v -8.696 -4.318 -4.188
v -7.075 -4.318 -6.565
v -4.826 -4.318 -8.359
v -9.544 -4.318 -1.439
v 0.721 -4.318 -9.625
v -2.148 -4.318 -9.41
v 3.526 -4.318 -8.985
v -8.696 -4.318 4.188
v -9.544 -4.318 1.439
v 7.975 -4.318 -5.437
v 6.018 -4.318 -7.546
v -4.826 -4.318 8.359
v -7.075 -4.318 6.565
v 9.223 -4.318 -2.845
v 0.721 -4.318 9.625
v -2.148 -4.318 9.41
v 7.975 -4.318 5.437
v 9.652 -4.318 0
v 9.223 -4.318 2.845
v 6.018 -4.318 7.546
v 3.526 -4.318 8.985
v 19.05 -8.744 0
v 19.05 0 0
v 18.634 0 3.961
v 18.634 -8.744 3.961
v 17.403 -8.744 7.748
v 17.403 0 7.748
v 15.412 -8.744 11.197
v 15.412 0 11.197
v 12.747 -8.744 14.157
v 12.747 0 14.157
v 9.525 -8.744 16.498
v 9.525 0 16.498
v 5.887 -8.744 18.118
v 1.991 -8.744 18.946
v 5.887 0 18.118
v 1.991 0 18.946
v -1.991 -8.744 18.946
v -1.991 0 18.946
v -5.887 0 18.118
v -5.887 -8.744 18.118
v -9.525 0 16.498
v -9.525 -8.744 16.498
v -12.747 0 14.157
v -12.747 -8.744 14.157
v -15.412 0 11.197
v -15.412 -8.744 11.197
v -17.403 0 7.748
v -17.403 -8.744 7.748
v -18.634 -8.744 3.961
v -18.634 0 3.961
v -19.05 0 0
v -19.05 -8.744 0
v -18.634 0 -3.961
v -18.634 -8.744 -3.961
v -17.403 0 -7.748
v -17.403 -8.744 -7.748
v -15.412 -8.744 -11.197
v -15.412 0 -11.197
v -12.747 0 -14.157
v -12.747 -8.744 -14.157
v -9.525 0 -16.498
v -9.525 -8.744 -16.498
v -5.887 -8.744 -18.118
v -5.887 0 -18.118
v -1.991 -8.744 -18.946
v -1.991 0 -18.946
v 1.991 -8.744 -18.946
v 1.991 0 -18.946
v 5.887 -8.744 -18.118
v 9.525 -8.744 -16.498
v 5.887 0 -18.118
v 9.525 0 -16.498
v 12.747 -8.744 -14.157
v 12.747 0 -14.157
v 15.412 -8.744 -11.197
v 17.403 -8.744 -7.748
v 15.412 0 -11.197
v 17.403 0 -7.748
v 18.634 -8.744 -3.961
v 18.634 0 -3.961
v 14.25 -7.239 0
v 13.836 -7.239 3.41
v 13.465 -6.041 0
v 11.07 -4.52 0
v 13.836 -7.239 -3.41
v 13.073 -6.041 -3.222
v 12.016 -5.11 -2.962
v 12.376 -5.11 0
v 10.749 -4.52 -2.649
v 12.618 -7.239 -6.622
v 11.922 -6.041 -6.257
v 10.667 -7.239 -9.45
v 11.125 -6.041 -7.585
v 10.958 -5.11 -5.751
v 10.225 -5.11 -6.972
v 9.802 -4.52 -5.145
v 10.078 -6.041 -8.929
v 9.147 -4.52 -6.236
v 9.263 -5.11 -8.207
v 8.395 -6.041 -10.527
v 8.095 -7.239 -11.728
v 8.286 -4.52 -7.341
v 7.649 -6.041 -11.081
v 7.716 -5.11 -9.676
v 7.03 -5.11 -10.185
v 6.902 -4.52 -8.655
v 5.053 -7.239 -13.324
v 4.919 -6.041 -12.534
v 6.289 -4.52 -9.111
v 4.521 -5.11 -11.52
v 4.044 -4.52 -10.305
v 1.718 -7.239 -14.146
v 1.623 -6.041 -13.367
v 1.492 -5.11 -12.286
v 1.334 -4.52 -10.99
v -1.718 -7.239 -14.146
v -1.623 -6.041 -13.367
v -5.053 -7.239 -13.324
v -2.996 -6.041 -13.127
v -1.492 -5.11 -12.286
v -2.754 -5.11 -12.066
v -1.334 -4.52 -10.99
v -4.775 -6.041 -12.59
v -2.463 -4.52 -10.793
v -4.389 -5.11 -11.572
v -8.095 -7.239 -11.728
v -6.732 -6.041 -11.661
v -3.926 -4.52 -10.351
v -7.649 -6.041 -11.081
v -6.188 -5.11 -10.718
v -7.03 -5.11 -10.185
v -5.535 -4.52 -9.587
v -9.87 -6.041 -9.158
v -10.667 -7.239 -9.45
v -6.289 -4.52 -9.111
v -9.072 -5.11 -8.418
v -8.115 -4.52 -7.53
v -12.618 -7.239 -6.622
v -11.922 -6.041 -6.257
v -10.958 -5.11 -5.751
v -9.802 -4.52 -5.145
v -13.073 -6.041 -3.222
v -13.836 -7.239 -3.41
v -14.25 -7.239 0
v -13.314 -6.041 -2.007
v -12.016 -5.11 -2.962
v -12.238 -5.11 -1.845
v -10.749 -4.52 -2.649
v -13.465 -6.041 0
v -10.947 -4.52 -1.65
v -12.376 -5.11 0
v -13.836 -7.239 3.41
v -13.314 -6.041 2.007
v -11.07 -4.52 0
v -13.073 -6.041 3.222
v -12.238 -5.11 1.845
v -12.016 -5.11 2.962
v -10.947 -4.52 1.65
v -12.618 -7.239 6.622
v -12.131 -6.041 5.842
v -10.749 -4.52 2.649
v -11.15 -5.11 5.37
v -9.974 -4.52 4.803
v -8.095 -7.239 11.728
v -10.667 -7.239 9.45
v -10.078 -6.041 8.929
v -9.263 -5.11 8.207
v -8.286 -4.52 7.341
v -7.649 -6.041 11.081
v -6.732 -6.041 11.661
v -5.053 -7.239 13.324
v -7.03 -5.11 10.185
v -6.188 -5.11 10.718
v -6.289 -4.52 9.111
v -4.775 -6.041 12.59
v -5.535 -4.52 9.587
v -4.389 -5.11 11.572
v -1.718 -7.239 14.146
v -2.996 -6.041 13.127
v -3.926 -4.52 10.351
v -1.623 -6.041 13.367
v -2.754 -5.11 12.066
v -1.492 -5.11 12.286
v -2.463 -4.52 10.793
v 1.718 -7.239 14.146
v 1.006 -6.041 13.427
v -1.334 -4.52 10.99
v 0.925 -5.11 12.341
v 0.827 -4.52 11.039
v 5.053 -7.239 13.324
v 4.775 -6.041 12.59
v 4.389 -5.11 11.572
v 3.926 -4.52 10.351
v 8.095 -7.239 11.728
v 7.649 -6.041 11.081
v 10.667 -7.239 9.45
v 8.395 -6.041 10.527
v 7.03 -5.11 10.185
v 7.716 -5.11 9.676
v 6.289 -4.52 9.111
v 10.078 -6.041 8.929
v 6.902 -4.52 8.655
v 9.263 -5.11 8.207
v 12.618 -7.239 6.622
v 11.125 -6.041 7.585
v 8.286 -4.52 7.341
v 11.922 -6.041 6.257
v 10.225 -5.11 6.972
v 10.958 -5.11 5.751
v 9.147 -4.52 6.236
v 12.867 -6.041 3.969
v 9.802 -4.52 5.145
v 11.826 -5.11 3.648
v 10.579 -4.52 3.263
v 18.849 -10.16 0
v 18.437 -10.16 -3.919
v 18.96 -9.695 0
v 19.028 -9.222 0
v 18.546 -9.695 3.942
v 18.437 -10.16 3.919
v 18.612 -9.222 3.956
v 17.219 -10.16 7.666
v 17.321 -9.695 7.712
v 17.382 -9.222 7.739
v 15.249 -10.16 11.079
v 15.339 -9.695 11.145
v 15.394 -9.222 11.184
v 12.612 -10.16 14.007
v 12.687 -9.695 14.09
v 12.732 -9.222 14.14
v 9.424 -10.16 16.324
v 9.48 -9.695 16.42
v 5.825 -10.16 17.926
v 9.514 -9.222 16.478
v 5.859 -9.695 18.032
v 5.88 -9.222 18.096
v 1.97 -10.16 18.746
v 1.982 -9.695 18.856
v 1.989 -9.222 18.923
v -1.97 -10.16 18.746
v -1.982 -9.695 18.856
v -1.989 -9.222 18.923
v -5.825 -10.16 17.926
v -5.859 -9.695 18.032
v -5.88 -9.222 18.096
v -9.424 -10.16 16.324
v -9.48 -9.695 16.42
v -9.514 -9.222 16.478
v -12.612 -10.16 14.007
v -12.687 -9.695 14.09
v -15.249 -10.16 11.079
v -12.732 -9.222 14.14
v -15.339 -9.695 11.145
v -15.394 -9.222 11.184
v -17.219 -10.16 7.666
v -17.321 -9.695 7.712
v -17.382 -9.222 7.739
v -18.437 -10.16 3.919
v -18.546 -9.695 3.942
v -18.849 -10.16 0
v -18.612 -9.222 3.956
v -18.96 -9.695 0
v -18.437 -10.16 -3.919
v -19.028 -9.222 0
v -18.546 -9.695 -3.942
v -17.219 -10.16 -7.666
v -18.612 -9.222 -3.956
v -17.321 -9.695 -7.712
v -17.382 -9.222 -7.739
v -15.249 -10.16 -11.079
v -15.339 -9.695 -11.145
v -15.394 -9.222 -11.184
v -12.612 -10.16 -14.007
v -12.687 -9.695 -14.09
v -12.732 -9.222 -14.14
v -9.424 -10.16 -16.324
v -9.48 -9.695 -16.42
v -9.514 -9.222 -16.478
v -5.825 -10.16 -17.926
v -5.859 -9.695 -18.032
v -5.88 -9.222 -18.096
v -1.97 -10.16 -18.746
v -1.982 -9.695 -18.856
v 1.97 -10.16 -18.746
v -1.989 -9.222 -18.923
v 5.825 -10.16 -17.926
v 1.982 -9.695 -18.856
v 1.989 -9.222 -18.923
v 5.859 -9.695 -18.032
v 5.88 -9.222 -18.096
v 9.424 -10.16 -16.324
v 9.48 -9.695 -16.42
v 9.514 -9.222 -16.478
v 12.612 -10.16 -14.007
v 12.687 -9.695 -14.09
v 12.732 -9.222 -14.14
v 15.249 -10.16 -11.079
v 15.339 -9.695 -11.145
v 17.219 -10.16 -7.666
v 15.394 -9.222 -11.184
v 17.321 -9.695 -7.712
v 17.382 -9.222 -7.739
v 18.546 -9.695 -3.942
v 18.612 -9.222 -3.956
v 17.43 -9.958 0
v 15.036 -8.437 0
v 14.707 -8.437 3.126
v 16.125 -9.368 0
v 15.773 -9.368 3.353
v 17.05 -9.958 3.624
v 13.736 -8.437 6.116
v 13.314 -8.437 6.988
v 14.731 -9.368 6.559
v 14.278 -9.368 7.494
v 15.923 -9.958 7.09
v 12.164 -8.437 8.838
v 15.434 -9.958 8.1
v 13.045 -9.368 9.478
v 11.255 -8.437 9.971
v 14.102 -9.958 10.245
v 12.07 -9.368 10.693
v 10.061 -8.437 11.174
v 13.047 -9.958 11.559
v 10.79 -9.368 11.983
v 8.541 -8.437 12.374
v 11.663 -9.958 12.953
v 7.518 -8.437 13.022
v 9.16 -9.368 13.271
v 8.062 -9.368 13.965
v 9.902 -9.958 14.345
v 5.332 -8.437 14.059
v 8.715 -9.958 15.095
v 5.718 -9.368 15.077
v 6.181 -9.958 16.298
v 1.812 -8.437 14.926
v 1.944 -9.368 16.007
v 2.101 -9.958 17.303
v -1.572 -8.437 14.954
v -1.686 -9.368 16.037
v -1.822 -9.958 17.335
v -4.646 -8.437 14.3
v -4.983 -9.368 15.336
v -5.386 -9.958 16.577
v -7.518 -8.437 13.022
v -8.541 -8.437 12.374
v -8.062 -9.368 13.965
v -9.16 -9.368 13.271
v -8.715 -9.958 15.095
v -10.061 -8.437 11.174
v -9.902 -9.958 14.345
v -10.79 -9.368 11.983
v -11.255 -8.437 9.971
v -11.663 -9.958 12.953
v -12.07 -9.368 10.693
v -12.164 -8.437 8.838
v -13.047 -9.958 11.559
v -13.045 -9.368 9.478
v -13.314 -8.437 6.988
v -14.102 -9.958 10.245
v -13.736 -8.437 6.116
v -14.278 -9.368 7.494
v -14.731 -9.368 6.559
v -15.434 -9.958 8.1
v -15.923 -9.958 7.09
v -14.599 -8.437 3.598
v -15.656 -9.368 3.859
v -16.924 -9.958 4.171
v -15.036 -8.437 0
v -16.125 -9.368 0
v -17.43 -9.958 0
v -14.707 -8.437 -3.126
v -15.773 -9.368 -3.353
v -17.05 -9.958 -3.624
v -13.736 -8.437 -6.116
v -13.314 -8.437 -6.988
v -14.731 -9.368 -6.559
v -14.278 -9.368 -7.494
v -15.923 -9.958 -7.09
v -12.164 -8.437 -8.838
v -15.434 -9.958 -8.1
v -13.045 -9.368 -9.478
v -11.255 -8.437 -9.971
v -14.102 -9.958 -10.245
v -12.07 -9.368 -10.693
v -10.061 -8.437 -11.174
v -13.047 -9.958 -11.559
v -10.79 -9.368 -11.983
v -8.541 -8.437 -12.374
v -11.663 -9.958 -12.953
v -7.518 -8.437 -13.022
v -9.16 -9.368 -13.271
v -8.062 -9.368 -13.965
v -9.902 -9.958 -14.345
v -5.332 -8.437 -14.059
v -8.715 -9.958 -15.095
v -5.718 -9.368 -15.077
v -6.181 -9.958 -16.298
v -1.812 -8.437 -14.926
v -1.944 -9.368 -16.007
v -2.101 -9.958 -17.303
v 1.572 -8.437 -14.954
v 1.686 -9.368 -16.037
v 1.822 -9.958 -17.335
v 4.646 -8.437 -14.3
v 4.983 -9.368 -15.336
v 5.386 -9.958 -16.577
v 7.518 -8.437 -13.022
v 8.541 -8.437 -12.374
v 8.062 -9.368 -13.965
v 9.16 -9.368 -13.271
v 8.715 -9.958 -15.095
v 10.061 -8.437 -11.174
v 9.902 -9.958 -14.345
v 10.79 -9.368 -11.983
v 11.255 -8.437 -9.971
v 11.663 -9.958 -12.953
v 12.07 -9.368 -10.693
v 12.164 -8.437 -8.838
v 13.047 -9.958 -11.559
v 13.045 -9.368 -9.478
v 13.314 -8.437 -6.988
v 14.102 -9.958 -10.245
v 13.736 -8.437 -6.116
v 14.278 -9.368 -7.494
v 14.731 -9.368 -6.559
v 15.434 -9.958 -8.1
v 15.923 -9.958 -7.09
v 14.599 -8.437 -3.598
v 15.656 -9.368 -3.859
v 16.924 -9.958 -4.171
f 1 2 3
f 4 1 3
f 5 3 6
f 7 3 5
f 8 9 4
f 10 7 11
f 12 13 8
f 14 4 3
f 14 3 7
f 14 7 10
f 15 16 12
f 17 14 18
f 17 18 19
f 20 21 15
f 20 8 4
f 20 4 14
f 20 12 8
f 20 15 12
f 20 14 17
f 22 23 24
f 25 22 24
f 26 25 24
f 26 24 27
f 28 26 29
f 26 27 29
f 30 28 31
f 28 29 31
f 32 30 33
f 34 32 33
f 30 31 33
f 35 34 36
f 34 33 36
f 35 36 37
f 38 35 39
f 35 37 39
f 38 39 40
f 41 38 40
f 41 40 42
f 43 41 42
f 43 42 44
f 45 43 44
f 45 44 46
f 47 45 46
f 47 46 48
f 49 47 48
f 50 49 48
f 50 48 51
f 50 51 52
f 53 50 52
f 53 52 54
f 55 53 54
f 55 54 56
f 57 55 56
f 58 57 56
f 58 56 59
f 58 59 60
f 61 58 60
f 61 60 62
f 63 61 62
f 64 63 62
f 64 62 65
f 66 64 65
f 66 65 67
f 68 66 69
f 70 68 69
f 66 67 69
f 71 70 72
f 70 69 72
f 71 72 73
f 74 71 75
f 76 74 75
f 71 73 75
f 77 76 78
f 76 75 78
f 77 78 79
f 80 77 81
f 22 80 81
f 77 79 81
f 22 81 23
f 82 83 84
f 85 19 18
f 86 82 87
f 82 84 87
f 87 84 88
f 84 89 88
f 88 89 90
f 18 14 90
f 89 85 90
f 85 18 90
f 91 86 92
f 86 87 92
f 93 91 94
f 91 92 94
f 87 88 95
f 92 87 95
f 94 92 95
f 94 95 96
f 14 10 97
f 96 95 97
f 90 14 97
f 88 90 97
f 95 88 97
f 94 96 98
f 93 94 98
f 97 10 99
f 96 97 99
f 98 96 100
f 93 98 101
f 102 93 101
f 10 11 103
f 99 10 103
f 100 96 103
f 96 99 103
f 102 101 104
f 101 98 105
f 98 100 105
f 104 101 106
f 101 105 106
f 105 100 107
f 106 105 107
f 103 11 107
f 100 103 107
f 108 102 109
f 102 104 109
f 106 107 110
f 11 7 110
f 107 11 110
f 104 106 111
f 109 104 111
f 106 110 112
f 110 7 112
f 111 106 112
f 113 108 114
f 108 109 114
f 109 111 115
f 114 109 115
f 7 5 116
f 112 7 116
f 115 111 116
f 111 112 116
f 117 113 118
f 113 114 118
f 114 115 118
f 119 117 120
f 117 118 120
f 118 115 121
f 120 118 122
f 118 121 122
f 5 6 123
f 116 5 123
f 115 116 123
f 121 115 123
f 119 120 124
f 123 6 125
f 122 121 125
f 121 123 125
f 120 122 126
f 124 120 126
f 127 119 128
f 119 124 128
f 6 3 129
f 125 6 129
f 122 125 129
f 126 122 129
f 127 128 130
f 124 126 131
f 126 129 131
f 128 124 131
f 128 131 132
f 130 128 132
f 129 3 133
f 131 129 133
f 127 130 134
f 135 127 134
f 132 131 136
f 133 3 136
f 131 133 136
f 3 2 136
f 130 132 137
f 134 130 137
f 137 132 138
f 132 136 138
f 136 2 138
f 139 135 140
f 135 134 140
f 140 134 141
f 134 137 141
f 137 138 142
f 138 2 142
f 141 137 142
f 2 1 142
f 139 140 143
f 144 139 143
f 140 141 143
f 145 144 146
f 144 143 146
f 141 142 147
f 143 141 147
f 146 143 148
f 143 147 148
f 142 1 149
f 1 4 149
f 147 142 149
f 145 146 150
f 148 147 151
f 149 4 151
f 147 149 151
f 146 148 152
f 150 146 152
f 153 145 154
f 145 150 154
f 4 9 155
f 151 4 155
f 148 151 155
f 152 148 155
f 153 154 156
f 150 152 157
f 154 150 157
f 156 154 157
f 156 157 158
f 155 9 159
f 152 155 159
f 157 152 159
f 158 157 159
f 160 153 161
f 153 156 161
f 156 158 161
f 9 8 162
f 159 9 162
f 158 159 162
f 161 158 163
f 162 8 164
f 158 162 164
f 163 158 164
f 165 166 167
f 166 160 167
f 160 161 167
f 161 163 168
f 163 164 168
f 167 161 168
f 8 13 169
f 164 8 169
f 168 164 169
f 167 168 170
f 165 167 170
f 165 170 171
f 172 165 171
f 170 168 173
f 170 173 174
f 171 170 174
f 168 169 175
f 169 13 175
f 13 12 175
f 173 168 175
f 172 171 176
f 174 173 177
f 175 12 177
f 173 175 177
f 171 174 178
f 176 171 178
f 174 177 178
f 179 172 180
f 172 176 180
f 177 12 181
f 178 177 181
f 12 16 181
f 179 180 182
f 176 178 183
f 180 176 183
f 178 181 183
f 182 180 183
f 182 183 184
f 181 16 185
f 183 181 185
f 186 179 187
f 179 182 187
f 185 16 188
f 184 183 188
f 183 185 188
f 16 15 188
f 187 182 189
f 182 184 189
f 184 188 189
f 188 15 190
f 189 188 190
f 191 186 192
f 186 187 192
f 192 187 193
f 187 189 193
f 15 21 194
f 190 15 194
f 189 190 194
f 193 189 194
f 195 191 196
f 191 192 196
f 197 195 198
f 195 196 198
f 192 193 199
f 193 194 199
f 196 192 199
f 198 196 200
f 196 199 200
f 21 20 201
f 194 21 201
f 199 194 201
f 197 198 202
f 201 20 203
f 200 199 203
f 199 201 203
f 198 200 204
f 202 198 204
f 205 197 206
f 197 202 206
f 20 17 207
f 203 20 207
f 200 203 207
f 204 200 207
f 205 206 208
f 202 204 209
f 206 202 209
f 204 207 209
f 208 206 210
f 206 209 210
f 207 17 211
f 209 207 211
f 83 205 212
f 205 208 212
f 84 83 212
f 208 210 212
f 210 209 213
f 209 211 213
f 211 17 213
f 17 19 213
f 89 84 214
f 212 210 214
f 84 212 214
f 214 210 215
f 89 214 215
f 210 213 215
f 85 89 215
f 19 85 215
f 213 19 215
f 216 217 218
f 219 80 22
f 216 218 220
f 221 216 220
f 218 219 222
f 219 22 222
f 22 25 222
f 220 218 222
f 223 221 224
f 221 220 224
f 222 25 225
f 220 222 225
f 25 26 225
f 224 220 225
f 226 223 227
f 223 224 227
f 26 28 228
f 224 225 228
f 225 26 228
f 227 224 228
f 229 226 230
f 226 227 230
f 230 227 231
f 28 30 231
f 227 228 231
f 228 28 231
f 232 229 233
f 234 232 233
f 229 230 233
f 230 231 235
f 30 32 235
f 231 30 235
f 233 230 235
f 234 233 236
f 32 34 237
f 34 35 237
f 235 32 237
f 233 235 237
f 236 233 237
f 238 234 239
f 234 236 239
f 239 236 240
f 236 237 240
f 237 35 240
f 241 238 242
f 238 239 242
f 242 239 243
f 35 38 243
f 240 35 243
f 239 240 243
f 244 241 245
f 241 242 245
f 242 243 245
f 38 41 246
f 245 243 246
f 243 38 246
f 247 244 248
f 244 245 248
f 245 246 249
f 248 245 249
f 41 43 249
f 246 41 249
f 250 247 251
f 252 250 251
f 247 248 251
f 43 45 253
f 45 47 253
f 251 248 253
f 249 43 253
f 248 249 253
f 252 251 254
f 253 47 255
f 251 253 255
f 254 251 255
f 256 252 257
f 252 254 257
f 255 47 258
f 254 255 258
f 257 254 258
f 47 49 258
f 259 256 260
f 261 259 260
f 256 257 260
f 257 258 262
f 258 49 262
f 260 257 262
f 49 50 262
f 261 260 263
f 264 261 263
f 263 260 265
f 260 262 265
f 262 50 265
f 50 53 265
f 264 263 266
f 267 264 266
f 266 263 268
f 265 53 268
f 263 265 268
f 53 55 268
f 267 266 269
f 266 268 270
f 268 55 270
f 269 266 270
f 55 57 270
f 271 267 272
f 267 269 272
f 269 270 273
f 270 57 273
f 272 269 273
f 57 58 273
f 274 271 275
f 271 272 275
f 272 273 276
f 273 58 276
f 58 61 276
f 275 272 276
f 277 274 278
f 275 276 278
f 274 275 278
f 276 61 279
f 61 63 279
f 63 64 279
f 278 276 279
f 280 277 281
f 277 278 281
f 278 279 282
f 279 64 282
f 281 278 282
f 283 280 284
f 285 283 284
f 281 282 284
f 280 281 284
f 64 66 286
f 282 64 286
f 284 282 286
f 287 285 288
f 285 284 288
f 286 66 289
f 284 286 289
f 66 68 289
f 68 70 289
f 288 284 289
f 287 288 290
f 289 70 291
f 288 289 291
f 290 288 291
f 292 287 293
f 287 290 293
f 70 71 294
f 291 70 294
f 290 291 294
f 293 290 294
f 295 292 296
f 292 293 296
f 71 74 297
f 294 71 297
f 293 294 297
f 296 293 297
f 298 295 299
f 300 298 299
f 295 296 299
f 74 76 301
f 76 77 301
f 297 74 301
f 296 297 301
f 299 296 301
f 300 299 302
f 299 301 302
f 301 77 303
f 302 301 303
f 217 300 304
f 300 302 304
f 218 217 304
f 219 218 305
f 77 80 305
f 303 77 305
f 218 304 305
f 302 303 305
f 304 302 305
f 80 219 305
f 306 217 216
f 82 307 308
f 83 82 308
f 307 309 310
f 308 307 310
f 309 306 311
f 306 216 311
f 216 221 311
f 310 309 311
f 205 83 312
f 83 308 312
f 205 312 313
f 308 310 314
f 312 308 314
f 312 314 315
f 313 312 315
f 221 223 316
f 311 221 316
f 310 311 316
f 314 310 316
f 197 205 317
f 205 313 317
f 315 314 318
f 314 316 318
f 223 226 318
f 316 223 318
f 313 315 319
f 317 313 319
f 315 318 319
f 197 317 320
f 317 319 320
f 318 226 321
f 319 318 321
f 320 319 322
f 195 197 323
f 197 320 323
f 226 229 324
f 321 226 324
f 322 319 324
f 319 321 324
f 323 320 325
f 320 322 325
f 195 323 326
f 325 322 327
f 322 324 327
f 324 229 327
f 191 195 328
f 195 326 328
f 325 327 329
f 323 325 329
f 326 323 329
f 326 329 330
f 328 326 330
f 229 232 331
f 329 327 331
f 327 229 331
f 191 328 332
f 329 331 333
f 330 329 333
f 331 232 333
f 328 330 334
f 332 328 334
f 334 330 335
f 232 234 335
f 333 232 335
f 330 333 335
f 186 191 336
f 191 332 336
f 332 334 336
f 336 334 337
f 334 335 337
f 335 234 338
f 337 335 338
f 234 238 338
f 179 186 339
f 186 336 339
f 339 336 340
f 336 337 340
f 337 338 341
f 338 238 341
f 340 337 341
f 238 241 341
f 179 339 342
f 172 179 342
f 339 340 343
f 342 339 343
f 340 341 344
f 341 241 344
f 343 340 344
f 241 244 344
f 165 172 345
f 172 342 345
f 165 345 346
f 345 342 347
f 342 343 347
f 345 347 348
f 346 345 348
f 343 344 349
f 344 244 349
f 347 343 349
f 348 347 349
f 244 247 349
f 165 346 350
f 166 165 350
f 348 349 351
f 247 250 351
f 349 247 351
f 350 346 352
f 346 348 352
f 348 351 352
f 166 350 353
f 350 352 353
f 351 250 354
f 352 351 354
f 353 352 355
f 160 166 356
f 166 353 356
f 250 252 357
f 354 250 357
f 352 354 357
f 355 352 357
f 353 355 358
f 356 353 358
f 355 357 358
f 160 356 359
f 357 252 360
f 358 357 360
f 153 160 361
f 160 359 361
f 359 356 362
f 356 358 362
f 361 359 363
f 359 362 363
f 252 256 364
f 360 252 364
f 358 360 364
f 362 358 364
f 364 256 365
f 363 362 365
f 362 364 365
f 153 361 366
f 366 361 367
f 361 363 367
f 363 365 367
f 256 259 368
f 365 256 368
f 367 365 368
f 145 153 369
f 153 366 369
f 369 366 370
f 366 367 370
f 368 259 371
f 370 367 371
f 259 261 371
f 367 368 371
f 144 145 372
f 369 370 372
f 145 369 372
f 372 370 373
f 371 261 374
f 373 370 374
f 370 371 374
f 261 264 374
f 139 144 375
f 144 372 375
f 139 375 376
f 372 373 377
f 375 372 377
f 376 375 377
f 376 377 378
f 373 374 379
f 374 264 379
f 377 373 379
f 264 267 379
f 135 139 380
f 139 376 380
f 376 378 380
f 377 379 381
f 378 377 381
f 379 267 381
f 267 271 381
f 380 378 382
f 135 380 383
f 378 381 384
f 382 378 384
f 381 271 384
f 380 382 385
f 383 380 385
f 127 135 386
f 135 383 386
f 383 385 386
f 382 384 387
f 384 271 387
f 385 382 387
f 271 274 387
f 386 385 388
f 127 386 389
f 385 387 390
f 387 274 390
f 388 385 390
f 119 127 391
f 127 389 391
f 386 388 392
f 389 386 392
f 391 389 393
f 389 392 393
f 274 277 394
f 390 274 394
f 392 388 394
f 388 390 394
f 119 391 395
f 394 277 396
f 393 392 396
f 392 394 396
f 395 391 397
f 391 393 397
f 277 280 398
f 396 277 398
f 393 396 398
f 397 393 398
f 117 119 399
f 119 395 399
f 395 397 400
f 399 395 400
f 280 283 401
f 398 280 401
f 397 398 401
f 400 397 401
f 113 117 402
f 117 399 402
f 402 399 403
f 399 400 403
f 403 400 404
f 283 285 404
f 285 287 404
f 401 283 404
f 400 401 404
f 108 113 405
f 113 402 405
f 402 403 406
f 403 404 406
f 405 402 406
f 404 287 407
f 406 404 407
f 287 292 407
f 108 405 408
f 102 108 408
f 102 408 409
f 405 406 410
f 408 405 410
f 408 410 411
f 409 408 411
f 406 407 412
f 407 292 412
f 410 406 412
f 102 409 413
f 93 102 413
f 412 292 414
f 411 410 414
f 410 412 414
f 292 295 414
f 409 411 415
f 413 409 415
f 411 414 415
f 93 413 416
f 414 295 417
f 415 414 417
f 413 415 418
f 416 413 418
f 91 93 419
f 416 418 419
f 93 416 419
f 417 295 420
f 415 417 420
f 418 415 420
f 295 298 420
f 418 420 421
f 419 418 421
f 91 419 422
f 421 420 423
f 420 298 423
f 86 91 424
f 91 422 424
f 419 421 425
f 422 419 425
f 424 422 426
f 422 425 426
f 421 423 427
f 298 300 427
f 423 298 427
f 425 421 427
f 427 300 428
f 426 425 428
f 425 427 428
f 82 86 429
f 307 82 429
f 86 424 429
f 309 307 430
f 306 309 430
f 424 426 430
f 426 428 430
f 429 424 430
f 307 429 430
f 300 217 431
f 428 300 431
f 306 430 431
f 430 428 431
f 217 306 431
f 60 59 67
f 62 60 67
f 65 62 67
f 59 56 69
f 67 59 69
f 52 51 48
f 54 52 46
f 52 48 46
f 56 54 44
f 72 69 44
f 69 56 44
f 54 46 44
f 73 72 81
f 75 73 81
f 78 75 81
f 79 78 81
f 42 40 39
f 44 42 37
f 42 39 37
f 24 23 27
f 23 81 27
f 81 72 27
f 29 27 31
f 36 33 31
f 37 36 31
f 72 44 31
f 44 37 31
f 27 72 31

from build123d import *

# Parameters (mm, degrees)
F0_R     = 19.05
F1_DEPTH = 10.16
F2_T     = -4.318
F3_R     = 5.08


# Not quite as in the source:
# - a fillet or chamfer that OpenCascade refuses, or shapes differently, is made with other operations: its cross-section is extruded or revolved along the edge and cut away or added


with BuildPart() as f1:
    # F0 (on Front) → F1 (new body)
    with BuildSketch(Plane.XZ):
        Circle(F0_R)
    extrude(amount=F1_DEPTH)

    # F2
    f2_openings = [f1.faces().sort_by_distance(p)[0] for p in [
        (0, -10.16, 0),
    ]]
    offset(amount=F2_T, openings=f2_openings)

    # F3
    f3_edges = [f1.edges().sort_by_distance(p)[0] for p in [
        (-14.732, -4.318, 0),
    ]]
    fillet(f3_edges, radius=F3_R)

    # F4: fillet of radius 5.08 on 1 edges, made by hand

    # F4_s1 → F4_t2 (revolve, cut)
    with BuildSketch(Plane.XY):
        with BuildLine():
            ThreePointArc((14.2503822155, -7.239), (16.1249178862, -9.3680135261), (18.848764431, -10.16))
            Line((18.848764431, -10.16), (18.848764431, -10.668))
            Line((18.848764431, -10.668), (14.732, -10.668))
            Line((14.732, -10.668), (14.224, -10.16))
            ThreePointArc((14.224, -10.16), (14.224, -9.398), (13.790543994, -7.4549))
            Line((13.790543994, -7.4549), (14.2503822155, -7.239))
        make_face()
    revolve(axis=Axis((0, -10.16, 0), (0, -1, 0)), mode=Mode.SUBTRACT)

    # F5: fillet of radius 5.08 on 1 edges, made by hand

    # F5_s1 → F5_t2 (revolve, cut)
    with BuildSketch(Plane.XY):
        with BuildLine():
            ThreePointArc((18.848764431, -10.16), (18.9994394971, -9.4592919765), (19.05, -8.7443525768))
            Line((19.05, -8.7443525768), (19.05, -10.16))
            Line((19.05, -10.16), (18.848764431, -10.16))
        make_face()
    revolve(axis=Axis((0, -10.16, 0), (0, -1, 0)), mode=Mode.SUBTRACT)


solid = f1.part
